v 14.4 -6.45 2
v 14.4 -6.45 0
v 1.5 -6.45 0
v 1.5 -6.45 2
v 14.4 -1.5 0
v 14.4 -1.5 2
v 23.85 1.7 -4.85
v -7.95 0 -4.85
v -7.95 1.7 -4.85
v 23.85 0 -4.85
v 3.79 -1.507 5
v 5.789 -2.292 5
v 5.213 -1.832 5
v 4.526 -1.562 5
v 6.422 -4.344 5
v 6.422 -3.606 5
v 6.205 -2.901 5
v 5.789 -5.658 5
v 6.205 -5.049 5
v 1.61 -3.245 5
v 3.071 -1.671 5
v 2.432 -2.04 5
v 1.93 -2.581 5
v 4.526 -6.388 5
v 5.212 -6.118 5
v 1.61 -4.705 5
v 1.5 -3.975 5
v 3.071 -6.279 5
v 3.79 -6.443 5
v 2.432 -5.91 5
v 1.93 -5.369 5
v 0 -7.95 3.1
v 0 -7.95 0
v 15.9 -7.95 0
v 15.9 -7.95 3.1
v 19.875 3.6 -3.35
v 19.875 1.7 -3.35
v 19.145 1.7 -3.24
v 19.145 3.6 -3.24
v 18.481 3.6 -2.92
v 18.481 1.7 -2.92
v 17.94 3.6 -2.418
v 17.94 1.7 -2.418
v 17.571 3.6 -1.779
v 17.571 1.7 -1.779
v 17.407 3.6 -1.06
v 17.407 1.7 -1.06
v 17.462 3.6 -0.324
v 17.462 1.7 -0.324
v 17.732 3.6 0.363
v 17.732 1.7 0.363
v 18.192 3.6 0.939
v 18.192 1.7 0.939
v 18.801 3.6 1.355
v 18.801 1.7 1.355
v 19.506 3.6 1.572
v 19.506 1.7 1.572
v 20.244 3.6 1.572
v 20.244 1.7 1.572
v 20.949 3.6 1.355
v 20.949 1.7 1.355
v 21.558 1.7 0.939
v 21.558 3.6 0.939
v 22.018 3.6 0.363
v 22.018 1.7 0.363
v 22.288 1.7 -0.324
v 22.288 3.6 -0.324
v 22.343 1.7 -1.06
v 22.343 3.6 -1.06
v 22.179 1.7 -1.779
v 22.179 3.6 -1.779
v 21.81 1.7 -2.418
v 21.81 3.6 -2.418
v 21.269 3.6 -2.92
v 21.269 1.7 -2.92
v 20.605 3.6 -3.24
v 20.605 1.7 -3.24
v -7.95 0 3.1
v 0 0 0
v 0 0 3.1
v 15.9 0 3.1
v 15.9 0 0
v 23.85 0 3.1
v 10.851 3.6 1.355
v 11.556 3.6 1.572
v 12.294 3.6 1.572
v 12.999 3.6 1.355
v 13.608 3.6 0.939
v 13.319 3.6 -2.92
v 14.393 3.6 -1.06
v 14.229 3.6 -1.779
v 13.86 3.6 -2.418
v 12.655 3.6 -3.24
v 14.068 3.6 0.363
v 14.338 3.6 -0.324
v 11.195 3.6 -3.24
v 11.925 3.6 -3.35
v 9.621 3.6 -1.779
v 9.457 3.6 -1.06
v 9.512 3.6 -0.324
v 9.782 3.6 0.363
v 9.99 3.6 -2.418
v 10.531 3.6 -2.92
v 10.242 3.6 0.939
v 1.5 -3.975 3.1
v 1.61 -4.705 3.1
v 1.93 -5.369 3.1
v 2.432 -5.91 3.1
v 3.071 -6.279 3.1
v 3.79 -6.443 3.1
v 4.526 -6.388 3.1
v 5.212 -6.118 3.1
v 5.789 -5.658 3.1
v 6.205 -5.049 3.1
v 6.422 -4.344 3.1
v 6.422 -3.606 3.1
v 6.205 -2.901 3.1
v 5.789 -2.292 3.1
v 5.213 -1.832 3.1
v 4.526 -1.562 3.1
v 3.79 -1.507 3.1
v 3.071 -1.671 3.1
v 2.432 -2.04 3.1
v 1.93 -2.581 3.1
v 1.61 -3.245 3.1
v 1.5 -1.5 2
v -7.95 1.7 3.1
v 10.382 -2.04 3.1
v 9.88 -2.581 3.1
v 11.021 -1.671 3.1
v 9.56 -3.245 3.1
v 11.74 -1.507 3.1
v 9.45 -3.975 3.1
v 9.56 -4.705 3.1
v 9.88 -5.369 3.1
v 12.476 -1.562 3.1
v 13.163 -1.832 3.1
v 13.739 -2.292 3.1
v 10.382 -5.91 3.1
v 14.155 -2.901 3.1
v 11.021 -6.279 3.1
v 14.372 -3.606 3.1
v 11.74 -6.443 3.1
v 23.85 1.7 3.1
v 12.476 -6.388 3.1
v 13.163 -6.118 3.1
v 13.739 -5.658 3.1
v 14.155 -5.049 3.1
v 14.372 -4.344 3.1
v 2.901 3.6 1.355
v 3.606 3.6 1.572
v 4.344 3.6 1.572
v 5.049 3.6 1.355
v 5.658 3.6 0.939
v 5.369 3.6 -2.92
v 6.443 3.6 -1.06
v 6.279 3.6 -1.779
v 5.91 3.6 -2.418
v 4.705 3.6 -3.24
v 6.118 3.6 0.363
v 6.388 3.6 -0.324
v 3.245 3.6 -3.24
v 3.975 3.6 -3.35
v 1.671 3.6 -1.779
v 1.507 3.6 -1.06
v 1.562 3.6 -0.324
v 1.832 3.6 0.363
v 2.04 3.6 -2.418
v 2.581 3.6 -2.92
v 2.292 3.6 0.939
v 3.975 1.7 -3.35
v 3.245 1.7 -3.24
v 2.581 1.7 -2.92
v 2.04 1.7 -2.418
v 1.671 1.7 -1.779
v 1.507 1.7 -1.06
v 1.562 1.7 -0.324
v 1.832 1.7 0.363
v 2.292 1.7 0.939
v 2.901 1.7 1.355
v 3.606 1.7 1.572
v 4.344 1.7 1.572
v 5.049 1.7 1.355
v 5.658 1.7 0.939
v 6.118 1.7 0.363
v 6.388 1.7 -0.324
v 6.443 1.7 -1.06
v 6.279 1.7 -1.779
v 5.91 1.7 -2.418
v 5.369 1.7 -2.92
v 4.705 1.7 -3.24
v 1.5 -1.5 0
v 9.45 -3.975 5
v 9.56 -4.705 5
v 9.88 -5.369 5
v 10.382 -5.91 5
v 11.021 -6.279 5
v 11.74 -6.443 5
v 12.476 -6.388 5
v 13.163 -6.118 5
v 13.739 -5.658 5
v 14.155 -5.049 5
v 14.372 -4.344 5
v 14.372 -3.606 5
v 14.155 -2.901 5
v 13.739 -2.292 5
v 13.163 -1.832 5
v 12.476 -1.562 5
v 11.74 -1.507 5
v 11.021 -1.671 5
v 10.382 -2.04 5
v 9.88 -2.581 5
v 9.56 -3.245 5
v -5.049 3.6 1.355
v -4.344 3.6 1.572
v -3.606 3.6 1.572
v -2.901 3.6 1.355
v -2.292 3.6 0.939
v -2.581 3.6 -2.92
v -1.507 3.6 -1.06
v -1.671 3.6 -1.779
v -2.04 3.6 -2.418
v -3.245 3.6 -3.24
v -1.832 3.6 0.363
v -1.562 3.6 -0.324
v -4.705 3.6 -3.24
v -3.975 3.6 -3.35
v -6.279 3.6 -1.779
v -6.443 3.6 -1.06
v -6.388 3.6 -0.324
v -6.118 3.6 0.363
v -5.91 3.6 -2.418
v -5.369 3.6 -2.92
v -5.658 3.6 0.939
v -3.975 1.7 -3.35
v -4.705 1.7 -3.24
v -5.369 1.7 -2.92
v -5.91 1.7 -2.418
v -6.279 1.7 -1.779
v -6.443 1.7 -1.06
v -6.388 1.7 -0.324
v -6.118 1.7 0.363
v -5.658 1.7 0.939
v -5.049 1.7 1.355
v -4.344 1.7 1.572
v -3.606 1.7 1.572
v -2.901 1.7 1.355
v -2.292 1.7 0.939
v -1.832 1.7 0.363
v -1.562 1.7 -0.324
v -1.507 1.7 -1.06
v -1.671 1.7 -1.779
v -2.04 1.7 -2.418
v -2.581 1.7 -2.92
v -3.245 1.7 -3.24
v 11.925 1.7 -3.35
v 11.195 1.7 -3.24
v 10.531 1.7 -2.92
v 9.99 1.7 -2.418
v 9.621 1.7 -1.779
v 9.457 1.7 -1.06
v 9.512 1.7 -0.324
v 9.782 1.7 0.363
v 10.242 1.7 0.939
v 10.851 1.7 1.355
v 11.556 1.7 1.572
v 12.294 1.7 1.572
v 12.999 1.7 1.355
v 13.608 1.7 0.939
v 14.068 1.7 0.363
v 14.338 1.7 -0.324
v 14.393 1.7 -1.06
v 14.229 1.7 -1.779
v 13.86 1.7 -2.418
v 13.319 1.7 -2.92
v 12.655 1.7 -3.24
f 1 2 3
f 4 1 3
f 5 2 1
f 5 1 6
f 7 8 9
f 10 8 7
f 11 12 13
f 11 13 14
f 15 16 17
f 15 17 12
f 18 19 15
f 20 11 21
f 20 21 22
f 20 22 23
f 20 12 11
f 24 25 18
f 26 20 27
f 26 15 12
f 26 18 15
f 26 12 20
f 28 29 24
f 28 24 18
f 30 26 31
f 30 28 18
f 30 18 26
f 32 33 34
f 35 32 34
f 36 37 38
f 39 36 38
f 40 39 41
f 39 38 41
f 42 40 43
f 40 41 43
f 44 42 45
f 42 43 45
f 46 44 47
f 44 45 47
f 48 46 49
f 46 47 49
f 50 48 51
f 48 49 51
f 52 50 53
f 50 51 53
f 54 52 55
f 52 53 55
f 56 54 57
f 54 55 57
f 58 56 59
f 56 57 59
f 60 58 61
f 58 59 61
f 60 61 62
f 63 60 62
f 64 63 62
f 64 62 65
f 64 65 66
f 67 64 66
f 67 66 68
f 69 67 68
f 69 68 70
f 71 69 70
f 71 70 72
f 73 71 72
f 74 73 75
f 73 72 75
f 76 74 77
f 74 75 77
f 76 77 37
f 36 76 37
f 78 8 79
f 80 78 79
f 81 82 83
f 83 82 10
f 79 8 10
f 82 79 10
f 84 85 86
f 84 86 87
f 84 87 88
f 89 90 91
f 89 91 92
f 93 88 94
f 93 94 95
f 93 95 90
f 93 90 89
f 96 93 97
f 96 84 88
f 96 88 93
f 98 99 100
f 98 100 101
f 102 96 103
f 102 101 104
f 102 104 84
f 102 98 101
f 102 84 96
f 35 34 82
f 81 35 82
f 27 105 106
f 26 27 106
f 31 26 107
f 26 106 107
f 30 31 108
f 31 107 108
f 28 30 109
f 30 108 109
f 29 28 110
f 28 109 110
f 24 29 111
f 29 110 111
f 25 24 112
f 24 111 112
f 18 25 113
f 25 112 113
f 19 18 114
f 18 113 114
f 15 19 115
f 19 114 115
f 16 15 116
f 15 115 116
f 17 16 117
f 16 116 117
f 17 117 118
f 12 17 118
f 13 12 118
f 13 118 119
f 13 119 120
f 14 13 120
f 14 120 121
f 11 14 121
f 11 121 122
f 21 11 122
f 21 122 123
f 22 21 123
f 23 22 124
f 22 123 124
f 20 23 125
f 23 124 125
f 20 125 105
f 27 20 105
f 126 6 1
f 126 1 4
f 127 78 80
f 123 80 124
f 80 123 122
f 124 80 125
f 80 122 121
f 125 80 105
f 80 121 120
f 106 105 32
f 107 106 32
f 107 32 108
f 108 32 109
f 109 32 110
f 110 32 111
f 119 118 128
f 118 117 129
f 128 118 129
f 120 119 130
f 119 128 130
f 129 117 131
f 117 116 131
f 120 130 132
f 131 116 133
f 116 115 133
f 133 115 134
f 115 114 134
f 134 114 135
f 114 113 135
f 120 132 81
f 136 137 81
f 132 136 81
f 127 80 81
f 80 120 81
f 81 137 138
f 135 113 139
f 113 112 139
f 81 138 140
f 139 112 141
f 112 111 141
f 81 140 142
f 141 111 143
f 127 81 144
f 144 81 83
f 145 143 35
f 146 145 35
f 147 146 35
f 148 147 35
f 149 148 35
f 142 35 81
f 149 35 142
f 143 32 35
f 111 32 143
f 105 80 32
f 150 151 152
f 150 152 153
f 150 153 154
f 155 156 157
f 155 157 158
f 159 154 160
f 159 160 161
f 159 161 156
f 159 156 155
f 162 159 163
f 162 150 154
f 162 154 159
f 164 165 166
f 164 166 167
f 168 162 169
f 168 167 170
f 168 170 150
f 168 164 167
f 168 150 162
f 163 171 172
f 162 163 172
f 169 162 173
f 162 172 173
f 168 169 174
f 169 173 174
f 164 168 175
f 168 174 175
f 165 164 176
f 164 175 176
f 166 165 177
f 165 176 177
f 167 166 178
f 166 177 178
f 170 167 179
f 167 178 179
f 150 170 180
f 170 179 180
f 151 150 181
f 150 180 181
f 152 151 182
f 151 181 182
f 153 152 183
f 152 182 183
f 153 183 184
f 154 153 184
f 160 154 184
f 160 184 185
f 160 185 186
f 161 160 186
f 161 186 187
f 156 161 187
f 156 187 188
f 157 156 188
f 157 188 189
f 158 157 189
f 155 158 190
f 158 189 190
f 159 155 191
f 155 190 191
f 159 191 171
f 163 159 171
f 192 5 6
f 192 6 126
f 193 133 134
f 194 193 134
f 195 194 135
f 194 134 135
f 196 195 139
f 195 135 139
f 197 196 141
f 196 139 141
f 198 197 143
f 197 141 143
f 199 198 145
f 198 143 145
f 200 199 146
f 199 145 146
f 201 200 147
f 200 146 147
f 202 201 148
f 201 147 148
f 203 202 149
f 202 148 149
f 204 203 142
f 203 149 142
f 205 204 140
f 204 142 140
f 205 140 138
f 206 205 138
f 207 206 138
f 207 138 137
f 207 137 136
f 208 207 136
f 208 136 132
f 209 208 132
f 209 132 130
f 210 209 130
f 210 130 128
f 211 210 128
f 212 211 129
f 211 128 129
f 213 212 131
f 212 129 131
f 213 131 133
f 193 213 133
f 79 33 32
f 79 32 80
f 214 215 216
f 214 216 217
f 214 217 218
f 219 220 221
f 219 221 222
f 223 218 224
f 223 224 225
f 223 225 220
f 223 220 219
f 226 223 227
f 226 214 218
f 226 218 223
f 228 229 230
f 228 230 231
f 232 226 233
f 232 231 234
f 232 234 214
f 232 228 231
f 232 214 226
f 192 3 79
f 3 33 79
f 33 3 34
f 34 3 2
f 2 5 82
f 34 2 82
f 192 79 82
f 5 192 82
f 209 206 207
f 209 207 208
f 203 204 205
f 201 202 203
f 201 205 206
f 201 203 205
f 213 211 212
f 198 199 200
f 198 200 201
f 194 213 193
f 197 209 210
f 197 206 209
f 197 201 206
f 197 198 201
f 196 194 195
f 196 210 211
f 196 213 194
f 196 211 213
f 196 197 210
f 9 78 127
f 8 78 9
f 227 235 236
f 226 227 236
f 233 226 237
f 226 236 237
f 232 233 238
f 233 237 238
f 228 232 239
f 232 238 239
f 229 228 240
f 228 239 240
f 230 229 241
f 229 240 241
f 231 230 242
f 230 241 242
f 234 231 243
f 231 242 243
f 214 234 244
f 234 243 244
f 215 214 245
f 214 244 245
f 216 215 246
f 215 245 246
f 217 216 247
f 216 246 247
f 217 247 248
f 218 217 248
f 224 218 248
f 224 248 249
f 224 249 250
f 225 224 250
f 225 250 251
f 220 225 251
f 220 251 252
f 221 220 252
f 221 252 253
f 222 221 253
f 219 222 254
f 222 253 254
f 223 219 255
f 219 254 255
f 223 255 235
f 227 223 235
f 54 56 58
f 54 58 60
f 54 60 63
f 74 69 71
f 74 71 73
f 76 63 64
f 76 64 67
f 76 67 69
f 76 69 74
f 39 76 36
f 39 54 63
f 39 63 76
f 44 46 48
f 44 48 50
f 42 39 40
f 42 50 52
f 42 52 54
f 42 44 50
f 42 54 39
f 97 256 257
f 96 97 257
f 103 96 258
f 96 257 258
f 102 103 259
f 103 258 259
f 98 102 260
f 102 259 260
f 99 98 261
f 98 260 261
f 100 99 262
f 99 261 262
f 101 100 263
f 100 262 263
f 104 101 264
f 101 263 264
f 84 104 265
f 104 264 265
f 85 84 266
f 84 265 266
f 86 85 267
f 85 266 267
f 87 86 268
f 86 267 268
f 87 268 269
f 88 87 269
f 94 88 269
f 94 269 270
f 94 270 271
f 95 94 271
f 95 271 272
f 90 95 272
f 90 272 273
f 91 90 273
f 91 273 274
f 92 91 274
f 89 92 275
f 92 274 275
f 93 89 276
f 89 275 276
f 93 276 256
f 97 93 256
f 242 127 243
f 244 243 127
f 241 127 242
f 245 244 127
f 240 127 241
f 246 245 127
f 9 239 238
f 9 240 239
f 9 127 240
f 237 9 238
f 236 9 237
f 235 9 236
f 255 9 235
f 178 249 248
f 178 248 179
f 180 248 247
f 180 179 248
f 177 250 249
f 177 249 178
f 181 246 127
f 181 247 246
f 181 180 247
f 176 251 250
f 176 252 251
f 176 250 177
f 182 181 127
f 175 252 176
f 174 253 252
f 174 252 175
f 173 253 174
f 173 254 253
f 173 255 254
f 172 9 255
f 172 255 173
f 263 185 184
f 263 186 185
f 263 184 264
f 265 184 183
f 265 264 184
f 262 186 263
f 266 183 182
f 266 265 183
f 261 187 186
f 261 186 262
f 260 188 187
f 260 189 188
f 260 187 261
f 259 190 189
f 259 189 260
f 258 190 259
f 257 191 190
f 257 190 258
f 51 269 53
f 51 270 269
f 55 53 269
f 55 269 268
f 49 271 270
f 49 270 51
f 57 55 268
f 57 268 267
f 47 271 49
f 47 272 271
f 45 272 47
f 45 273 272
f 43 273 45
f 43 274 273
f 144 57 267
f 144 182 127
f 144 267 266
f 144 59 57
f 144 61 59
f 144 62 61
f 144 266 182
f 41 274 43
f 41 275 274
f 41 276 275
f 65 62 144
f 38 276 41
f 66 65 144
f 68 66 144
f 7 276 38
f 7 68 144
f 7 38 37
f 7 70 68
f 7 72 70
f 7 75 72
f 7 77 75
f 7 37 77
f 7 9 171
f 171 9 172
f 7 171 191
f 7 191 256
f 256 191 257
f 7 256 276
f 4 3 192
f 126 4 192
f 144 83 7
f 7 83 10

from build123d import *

# Parameters (mm, degrees)
SKETCH1_W           = 15.9
SKETCH1_H           = 7.95
BOSS_EXTRUDE1_DEPTH = 3.1
SKETCH2_R           = 2.475
BOSS_EXTRUDE2_DEPTH = 1.9
SKETCH3_W           = 12.9
SKETCH3_H           = 4.95
CUT_EXTRUDE1_DEPTH  = 2
SKETCH4_W           = 31.8
SKETCH4_H           = 7.95
BOSS_EXTRUDE3_DEPTH = 1.7
SKETCH5_R           = 2.475
BOSS_EXTRUDE4_DEPTH = 1.9
LPATTERN1_COUNT     = 4
LPATTERN1_PITCH     = 7.95


with BuildPart() as part:
    # Sketch1 → Boss-Extrude1 (new body)
    with BuildSketch(Plane.XY):
        with Locations((7.95, -3.975)):
            Rectangle(SKETCH1_W, SKETCH1_H)
    extrude(amount=BOSS_EXTRUDE1_DEPTH)

    # Sketch2 → Boss-Extrude2 (add)
    with BuildSketch(Plane.XY.offset(3.1)):
        with Locations(Location((3.975, -3.975, 0), (0, 0, 180))):
            Circle(SKETCH2_R)
        with Locations(Location((11.925, -3.975, 0), (0, 0, 180))):
            Circle(SKETCH2_R)
    extrude(amount=BOSS_EXTRUDE2_DEPTH)

    # Sketch3 → Cut-Extrude1 (cut)
    with BuildSketch(Plane(origin=(0, 0, 0), x_dir=(-1, 0, 0), z_dir=(0, 0, -1))):
        with Locations((-7.95, -3.975)):
            Rectangle(SKETCH3_W, SKETCH3_H)
    extrude(amount=-CUT_EXTRUDE1_DEPTH, mode=Mode.SUBTRACT)

    # Sketch4 → Boss-Extrude3 (add)
    with BuildSketch(Plane(origin=(0, 0, 0), x_dir=(1, 0, 0), z_dir=(0, 1, 0))):
        with Locations((7.95, 0.875)):
            Rectangle(SKETCH4_W, SKETCH4_H)
    extrude(amount=BOSS_EXTRUDE3_DEPTH)

    # Sketch5 → Boss-Extrude4 (add)
    with BuildSketch(Plane(origin=(0, 1.7, 0), x_dir=(1, 0, 0), z_dir=(0, 1, 0))):
        with Locations(Location((-3.975, 0.875, 0), (0, 0, 90))):
            Circle(SKETCH5_R)
    boss_extrude4 = extrude(amount=BOSS_EXTRUDE4_DEPTH)

    # LPattern1: Boss-Extrude4 ×4
    with Locations(*[(i * LPATTERN1_PITCH, 0, 0) for i in range(1, LPATTERN1_COUNT)]):
        add(boss_extrude4)


solid = part.part
